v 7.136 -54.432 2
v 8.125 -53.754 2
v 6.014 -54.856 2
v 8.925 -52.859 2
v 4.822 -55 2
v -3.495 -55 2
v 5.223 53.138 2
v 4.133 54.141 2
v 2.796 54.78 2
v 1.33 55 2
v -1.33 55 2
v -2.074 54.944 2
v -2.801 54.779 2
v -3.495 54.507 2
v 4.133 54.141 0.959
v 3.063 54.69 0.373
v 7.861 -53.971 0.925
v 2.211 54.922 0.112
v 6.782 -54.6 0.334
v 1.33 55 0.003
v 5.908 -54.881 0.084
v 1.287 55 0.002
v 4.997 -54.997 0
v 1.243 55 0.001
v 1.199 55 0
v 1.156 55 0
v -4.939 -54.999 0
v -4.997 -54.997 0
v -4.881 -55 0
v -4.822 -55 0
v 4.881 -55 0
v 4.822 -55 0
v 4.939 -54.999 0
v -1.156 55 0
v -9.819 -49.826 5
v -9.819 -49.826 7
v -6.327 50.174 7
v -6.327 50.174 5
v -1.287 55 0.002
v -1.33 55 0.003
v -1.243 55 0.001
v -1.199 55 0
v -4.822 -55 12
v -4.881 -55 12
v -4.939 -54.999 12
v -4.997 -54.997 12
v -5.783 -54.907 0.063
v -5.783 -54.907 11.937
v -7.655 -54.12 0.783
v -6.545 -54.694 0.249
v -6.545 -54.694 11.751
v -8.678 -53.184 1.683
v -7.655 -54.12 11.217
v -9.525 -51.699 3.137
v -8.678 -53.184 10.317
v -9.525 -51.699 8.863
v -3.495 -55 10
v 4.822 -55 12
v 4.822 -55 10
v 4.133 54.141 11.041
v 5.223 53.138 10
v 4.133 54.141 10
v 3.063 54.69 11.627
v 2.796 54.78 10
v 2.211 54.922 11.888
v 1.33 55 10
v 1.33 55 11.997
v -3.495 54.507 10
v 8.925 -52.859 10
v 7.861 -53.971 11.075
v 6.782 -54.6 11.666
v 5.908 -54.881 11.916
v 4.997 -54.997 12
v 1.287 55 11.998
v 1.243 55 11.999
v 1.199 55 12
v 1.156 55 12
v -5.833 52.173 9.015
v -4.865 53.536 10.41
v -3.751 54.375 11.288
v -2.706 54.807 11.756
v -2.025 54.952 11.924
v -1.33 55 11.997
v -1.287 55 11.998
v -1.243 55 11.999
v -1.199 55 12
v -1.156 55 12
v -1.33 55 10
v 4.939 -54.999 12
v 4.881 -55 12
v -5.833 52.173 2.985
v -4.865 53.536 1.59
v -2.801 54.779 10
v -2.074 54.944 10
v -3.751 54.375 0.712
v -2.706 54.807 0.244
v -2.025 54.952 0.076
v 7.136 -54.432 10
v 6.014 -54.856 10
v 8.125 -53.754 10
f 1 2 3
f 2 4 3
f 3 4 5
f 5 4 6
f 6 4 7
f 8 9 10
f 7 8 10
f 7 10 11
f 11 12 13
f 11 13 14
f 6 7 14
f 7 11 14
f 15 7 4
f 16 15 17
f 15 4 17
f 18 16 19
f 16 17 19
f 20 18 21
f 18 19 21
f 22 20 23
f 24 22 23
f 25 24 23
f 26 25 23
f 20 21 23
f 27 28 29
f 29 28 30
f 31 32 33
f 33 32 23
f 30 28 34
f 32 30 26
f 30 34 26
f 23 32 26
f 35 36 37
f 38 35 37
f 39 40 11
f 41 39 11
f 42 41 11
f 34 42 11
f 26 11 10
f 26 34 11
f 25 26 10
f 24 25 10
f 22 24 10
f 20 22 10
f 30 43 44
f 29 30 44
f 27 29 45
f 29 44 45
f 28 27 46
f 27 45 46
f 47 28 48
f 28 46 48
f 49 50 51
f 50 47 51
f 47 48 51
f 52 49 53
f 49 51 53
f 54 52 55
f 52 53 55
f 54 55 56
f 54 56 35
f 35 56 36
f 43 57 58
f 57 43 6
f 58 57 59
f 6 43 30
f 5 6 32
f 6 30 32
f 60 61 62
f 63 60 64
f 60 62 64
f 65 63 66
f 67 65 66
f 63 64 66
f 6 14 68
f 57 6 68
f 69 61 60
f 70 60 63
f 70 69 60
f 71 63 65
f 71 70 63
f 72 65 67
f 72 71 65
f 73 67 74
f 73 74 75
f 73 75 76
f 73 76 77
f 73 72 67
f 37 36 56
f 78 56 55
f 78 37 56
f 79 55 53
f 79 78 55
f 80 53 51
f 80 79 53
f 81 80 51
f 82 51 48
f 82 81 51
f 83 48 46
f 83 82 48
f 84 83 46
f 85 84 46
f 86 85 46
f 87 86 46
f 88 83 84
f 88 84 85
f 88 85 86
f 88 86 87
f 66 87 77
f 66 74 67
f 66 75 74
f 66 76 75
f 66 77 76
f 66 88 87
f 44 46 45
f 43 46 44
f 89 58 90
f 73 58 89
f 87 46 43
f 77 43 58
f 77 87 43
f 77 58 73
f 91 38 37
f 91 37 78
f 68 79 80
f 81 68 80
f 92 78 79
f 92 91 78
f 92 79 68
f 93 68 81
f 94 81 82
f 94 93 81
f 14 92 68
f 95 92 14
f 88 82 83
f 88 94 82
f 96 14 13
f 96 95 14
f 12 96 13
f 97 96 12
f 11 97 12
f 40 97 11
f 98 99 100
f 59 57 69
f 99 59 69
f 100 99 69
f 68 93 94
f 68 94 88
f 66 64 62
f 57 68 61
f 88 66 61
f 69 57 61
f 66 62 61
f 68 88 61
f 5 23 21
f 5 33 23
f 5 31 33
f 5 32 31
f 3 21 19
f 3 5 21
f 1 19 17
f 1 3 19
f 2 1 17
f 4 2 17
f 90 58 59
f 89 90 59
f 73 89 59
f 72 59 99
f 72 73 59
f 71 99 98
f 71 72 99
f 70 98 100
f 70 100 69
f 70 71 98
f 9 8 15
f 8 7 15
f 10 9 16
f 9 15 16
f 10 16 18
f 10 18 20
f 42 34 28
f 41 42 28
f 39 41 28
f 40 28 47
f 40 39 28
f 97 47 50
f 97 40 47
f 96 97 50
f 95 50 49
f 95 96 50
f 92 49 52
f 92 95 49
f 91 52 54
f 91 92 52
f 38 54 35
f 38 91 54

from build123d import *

# Parameters (mm, degrees)
F0_W     = 20
F0_H     = 110
F1_DEPTH = 12
F3_DEPTH = 12.001
F4_R     = 5
F5_R     = 5
F6_W     = 9.035658904
F6_H     = 8
F6_W_2   = 2.6605429637
F6_W_3   = 2.1650415125
F7_DEPTH = 110.001


with BuildPart() as f1:
    # F0 (on Top) → F1 (new body)
    with BuildSketch(Plane.XY):
        Rectangle(F0_W, F0_H)
    extrude(amount=F1_DEPTH)

    # F2 (on face) → F3 (cut, through all)
    with BuildSketch(Plane.XY.offset(12)):
        Polygon((6.1587153559, 55), (10, -55), (10, 55), align=None)
        Polygon((-10, 55), (-10, -55), (-6.1587153559, 55), align=None)
    extrude(amount=-F3_DEPTH, mode=Mode.SUBTRACT)

    # F4
    f4_edges = [f1.edges().sort_by_distance(p)[0] for p in [
        (8.079358, 0, 12),
        (10, -55, 6),
        (8.079358, 0, 0),
        (6.158715, 55, 6),
    ]]
    fillet(f4_edges, radius=F4_R)

    # F5
    f5_edges = [f1.edges().sort_by_distance(p)[0] for p in [
        (-10, -55, 6),
        (-8.079358, 0, 12),
        (-6.158715, 55, 6),
        (-8.079358, 0, 0),
    ]]
    fillet(f5_edges, radius=F5_R)

    # F6 (on face) → F7 (cut, through all)
    with BuildSketch(Plane(origin=(0, 55, 0), x_dir=(-1, 0, 0), z_dir=(0, 1, 0))):
        with Locations((-5.8481009339, 6)):
            Rectangle(F6_W, F6_H)
        with Locations((0, 6)):
            Rectangle(F6_W_2, F6_H)
        with Locations((2.4127922381, 6)):
            Rectangle(F6_W_3, F6_H)
    extrude(amount=-F7_DEPTH, mode=Mode.SUBTRACT)


solid = f1.part
